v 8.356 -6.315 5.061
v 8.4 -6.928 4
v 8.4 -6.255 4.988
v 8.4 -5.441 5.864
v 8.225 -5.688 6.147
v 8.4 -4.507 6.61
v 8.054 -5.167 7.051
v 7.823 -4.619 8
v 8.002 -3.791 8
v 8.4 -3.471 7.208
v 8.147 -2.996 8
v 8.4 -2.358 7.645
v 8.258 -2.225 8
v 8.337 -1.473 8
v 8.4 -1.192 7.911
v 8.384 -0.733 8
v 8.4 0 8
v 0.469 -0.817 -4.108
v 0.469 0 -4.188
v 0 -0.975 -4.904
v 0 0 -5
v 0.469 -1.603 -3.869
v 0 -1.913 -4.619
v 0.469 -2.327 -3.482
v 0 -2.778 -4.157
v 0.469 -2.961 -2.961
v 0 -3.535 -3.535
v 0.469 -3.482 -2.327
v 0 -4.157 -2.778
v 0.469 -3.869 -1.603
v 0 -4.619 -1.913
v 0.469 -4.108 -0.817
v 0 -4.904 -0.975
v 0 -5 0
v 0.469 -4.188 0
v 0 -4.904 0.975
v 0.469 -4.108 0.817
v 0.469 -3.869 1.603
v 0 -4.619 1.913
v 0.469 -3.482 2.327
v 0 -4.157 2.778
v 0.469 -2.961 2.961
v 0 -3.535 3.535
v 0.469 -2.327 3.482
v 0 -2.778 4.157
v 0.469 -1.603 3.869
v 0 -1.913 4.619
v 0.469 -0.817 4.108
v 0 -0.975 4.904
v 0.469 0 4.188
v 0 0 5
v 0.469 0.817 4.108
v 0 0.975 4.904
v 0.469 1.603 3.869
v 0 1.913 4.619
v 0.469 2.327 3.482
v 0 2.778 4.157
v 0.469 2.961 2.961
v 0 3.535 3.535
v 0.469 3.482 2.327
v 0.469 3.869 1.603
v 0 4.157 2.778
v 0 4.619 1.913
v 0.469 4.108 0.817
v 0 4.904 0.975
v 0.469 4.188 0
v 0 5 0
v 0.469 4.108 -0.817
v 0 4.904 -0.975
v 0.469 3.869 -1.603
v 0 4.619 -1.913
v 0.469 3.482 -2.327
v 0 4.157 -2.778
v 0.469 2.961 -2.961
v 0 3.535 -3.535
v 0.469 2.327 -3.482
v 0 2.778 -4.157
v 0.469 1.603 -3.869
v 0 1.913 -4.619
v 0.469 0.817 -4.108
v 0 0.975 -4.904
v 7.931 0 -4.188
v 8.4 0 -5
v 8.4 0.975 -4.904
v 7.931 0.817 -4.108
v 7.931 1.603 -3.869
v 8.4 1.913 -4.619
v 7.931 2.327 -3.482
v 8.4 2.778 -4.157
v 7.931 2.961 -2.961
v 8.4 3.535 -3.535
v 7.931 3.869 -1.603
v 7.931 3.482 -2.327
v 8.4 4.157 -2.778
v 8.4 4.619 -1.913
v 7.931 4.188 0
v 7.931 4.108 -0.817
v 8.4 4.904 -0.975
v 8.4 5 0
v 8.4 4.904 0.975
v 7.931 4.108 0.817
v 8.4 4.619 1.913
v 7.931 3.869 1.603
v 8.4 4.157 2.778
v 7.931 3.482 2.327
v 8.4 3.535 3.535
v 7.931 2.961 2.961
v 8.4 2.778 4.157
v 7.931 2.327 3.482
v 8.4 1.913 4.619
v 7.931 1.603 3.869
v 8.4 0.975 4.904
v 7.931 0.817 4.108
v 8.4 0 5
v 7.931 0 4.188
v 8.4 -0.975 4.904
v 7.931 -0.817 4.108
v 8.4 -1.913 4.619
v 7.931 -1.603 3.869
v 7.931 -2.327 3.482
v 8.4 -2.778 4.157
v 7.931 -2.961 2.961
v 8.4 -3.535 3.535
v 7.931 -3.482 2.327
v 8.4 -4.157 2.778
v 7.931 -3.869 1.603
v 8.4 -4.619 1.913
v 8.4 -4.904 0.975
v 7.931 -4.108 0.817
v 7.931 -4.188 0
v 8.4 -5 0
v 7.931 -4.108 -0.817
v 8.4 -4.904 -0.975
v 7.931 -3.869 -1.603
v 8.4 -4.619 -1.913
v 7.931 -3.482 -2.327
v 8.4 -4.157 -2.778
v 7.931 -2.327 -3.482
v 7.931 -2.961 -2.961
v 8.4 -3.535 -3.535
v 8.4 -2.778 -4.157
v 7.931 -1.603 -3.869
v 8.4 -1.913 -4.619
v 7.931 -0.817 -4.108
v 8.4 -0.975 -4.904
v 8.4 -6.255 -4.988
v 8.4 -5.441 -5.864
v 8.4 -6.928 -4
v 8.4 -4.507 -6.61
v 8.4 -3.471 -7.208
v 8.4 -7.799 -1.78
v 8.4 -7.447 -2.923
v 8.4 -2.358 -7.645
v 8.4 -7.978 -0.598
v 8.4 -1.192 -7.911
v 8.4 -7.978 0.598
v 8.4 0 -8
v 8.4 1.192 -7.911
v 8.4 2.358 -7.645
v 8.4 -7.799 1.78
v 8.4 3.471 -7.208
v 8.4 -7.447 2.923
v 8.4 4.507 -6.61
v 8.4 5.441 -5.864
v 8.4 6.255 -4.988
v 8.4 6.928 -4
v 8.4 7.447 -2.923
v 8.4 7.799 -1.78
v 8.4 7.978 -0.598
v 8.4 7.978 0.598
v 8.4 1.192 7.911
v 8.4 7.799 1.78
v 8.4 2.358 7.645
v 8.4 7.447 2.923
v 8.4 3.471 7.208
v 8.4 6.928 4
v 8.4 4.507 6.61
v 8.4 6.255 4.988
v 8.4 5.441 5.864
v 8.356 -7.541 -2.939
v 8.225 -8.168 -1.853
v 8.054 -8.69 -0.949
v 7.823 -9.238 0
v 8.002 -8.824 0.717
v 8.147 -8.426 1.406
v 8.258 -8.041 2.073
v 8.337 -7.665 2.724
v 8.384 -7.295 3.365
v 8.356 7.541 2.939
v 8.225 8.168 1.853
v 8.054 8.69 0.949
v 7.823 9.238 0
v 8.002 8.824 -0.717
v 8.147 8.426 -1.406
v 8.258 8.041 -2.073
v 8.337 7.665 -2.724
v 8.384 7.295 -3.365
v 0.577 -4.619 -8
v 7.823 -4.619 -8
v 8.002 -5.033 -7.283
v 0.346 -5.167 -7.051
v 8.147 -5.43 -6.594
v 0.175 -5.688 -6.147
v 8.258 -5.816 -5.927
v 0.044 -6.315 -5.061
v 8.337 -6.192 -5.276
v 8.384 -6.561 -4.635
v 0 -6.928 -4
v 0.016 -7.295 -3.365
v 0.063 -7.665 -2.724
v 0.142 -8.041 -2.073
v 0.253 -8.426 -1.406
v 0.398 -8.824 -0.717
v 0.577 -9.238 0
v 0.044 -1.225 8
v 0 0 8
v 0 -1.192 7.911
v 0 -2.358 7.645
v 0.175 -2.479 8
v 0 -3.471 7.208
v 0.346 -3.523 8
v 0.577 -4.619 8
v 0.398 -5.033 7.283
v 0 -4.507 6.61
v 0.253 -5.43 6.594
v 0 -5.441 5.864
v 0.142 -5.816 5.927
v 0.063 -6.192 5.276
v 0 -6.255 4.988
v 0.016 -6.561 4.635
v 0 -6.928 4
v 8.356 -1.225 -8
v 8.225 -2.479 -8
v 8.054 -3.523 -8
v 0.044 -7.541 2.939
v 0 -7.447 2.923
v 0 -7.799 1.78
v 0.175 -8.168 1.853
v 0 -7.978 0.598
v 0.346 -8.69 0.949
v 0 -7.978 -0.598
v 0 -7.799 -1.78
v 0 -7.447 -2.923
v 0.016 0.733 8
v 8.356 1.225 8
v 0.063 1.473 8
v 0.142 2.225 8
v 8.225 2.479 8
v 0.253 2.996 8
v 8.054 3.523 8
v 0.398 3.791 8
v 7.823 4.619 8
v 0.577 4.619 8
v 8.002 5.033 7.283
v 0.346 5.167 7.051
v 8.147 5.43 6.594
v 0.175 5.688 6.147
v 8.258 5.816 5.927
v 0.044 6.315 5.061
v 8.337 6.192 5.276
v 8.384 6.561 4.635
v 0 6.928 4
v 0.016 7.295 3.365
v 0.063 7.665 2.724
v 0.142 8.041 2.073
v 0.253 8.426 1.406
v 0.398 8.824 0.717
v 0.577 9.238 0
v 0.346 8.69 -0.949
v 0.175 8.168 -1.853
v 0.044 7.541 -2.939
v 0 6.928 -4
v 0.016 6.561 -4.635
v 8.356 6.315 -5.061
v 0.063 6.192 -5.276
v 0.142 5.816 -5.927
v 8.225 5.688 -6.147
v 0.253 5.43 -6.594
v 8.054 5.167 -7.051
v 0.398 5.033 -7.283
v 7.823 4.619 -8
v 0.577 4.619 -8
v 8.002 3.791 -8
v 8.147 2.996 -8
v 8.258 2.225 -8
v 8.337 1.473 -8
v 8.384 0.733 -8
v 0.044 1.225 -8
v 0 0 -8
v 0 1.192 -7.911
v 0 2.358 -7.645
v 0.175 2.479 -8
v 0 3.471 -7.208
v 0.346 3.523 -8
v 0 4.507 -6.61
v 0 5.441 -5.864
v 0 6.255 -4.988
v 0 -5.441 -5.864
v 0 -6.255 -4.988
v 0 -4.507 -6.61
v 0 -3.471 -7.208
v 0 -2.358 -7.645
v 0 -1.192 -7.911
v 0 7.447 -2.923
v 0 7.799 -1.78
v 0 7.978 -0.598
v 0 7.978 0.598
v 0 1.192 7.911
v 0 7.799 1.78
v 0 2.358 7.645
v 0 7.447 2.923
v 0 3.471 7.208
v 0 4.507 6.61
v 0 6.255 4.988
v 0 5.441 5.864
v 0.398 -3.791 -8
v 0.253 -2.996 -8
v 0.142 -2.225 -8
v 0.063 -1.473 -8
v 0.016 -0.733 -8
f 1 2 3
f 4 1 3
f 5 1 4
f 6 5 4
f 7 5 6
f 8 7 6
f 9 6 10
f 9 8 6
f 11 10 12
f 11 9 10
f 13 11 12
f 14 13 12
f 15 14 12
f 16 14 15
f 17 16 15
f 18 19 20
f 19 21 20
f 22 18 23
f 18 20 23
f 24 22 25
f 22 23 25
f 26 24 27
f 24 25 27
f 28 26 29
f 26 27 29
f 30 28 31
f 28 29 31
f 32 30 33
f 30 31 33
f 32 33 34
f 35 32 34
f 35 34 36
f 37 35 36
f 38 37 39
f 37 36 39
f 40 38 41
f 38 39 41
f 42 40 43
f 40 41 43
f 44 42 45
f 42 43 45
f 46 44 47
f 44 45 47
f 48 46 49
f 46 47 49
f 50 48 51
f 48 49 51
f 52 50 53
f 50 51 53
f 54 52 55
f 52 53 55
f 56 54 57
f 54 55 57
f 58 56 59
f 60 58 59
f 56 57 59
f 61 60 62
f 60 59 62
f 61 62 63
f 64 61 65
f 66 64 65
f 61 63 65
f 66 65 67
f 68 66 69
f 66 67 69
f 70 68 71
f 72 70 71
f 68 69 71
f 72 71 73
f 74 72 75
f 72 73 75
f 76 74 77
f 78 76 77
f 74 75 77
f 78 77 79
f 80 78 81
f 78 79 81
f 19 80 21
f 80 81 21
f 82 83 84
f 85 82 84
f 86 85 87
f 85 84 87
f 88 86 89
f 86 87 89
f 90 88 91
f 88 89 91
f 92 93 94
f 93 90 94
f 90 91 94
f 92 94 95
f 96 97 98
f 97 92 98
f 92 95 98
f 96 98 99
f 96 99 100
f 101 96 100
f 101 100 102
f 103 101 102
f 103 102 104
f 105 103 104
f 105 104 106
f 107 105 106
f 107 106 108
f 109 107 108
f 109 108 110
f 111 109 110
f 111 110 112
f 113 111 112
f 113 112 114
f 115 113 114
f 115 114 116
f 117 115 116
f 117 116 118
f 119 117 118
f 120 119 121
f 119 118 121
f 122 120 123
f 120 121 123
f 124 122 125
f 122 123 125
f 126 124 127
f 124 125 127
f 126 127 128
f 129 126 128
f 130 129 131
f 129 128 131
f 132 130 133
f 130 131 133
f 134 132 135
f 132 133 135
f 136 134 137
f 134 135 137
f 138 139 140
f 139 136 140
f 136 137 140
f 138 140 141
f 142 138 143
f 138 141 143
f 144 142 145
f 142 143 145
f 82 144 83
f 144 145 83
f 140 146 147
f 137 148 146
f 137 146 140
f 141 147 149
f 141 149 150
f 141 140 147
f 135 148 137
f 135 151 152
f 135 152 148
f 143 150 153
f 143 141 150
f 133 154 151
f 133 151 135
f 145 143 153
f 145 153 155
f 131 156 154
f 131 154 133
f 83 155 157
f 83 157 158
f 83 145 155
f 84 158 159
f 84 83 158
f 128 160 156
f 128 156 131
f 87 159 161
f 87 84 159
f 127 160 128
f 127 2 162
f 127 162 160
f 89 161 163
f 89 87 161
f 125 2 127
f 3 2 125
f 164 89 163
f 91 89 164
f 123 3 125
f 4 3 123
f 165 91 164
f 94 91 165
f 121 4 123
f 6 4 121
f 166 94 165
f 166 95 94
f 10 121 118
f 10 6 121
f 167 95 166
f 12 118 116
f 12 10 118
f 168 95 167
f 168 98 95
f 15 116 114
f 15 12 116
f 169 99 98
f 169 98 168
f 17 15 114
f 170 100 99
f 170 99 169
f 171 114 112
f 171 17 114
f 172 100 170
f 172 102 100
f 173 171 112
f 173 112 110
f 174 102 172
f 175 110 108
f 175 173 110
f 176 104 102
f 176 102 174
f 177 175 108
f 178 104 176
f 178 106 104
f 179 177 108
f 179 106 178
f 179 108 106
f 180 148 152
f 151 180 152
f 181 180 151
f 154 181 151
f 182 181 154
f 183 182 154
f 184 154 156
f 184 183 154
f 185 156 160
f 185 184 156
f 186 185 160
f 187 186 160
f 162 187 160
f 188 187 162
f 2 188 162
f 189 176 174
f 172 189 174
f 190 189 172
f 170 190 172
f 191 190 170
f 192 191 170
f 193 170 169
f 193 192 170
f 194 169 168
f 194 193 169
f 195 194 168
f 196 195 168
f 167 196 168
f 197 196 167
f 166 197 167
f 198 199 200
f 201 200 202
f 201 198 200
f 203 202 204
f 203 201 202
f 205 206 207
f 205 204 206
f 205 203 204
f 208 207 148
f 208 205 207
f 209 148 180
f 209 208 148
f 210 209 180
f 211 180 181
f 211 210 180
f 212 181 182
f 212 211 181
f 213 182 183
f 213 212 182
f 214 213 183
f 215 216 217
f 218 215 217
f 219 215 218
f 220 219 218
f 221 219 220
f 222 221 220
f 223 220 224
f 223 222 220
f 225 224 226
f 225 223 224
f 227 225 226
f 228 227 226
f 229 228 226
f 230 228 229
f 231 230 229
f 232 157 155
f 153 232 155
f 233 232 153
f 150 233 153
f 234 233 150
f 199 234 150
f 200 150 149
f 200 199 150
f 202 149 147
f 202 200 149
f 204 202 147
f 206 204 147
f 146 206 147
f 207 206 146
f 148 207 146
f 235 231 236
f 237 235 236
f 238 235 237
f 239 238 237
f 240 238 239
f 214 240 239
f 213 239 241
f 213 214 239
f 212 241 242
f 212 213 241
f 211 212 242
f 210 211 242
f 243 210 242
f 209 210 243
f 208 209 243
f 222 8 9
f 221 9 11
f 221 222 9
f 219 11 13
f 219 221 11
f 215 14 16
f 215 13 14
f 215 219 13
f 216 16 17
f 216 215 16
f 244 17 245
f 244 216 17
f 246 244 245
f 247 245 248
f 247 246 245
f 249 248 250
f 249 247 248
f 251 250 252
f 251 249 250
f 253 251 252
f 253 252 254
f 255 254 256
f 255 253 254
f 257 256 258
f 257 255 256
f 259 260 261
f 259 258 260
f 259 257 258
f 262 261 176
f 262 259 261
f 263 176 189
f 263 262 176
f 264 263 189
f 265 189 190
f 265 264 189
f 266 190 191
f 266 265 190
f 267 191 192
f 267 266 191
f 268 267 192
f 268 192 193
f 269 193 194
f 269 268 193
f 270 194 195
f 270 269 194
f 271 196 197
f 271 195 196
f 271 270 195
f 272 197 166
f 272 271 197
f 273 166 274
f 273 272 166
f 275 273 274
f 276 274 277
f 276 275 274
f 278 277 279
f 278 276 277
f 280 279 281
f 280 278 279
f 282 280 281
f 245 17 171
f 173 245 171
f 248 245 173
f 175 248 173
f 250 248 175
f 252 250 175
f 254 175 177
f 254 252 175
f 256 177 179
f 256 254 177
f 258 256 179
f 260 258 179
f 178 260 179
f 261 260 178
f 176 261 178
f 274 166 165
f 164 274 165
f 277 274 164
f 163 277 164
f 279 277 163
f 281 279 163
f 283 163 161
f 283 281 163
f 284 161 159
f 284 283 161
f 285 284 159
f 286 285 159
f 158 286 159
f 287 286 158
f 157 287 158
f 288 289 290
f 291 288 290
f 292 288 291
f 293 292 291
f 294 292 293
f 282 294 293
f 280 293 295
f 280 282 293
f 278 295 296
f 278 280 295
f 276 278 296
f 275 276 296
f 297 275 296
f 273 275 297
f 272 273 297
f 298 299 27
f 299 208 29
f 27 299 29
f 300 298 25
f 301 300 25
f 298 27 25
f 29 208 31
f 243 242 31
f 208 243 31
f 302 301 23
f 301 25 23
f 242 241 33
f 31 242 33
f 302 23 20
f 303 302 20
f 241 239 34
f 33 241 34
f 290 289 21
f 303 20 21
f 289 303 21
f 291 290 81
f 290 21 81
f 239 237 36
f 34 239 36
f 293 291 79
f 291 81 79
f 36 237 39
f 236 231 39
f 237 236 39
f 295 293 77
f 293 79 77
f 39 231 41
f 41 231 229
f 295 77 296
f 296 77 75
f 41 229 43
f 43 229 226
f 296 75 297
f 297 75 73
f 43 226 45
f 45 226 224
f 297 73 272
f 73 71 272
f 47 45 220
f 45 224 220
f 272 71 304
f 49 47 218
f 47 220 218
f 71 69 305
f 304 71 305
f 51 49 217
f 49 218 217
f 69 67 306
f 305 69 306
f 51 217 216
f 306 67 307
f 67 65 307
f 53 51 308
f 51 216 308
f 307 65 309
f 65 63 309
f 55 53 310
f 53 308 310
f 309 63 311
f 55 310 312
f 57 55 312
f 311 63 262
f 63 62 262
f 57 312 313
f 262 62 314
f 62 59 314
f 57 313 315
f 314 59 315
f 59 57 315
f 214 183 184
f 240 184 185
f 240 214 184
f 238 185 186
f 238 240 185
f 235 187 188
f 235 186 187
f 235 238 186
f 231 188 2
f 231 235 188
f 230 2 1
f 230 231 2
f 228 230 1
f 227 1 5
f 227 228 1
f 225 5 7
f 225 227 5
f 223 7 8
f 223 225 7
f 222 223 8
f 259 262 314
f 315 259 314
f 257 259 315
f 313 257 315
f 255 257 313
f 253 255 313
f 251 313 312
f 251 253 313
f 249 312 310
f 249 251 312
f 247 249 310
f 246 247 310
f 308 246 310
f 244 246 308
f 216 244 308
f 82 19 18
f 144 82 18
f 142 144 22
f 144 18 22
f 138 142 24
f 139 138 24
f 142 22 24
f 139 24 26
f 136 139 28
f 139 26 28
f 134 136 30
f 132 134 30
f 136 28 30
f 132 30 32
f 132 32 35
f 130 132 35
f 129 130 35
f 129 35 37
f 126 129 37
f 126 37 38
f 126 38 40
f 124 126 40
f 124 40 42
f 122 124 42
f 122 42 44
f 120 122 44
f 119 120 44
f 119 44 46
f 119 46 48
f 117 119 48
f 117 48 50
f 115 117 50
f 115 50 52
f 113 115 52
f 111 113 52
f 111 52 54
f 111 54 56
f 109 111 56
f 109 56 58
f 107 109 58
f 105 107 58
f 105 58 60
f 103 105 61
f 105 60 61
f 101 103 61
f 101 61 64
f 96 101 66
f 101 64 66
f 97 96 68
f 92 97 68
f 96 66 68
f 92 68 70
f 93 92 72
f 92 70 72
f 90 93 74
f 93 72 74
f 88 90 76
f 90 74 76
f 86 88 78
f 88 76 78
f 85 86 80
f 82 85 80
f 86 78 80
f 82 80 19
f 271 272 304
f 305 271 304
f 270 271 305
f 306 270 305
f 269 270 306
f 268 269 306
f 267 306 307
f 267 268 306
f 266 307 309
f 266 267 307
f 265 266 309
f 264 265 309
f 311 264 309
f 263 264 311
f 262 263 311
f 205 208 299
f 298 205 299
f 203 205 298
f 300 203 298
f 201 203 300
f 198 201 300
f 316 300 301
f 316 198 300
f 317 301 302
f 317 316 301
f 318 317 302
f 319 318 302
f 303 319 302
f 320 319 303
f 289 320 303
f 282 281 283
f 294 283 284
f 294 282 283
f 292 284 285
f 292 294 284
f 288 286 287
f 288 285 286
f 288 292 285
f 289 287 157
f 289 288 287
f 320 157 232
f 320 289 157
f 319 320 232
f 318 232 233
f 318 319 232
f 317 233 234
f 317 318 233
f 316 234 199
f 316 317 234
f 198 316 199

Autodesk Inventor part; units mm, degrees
ref_plane "YZ Plane" through (0, 0, 0) normal (1, 0, 0) x (0, 1, 0)
ref_plane "XZ Plane" through (0, 0, 0) normal (0, 1, 0) x (-1, 0, 0)
sketch "Эскиз1" plane through (0, 0, 0) normal (1, 0, 0) x (0, 1, 0)
  line L0 (-9.2376, 0) -> (-4.6188, 8)
  line L1 (-4.6188, 8) -> (4.6188, 8)
  line L2 (4.6188, 8) -> (9.2376, 0)
  line L3 (9.2376, 0) -> (4.6188, -8)
  line L4 (4.6188, -8) -> (-4.6188, -8)
  line L5 (-4.6188, -8) -> (-9.2376, 0)
  point P0 (0, 0)
  point P1 (0, 0)
  dimension "d0" = 18.4752
extrude "Базовый элемент" add sketch "Эскиз1" along normal blind 8.4
sketch "Эскиз2" plane through (0, 0, 0) normal (0, 0, 1) x (1, 0, 0)
  line L0 (0, 4.6188) -> (0, 9.2376) projected
  line L1 (0, 9.2376) -> (8.4, 9.2376) projected
  line L2 (8.4, 4.6188) -> (8.4, 9.2376) projected
  line L3 (-1.68, 0) -> (10.08, 0) projected
  line L4 (0.5771, 9.2376) -> (0, 8)
  line L5 (7.8229, 9.2376) -> (8.4, 8)
  dimension "d3" = 25
  dimension "d4" = 25
  dimension "d5" = 16
  dimension "d6" = 16
revolve "Фаска1" cut sketch "Эскиз2" angle 360 about axis through (-10, 0, 0) along (1, 0, 0)
sketch "Эскиз3" plane through (8.4, 0, 0) normal (1, 0, 0) x (0, 0, -1)
  arc A0 (-4, -6.9282) -> (4, -6.9282) centre (0, 0) ccw projected
hole "Резьба" at (8.4, 0, 0) direction (-1, 0, 0) diameter 8.376 end through all thread size "M10x1.5" class "6H" standard "ANSI Metric M Profile"
chamfer "Фаска2" distance 0.8119 angle 30 1 edges at (8.4, 0, 4.188) measured on face at (8.4, 6.6899, -0.1683)
chamfer "Фаска3" distance 0.8119 angle 30 1 edges at (0, 0, 4.188) measured on face at (0, 6.6899, -0.1683)
ref_plane "Work Plane1" through (-17.4436, 0, 0) normal (0, -0.866, -0.5) x (1, 0, 0)
equation "\"d0\" = 1.1547 * SW"
equation "\"d1\" = KOH"
equation "\"d3\" = ANG1"
equation "\"d4\" = ANG2"
equation "\"d5\" = SW0"
equation "\"d6\" = SW01"
equation "\"d8\" = -0.5 * GD1 + 0.5 * NND"
equation "\"d40\" = -0.5 * GD1 + 0.5 * NND"
equation "\"d10\" = -0.5 * GD1 + 0.5 * NND"
equation "\"d41\" = -0.5 * GD1 + 0.5 * NND"
equation "\"ANG1\" = 25deg"
equation "\"ANG2\" = 25deg"
equation "\"KOH\" = 8.4"
equation "\"SW\" = 16"
equation "\"SW0\" = SW"
equation "\"SW01\" = SW"
equation "\"GUL\" = 0.541266 * PTC"
equation "\"TOA\" = 30deg"
equation "\"PTC\" = 1.5"
equation "\"E0\" = 1.155 * SW"
equation "\"GAL\" = 0.541266 * PTC"
equation "\"SD2\" = 0"
equation "\"WFT\" = 0"
equation "\"GD1\" = 8.376202"
equation "\"NND\" = 10"
properties part number "ANSI B 18.2.4.1 M - M10 x 1,5" material "Сталь, мягкая"
